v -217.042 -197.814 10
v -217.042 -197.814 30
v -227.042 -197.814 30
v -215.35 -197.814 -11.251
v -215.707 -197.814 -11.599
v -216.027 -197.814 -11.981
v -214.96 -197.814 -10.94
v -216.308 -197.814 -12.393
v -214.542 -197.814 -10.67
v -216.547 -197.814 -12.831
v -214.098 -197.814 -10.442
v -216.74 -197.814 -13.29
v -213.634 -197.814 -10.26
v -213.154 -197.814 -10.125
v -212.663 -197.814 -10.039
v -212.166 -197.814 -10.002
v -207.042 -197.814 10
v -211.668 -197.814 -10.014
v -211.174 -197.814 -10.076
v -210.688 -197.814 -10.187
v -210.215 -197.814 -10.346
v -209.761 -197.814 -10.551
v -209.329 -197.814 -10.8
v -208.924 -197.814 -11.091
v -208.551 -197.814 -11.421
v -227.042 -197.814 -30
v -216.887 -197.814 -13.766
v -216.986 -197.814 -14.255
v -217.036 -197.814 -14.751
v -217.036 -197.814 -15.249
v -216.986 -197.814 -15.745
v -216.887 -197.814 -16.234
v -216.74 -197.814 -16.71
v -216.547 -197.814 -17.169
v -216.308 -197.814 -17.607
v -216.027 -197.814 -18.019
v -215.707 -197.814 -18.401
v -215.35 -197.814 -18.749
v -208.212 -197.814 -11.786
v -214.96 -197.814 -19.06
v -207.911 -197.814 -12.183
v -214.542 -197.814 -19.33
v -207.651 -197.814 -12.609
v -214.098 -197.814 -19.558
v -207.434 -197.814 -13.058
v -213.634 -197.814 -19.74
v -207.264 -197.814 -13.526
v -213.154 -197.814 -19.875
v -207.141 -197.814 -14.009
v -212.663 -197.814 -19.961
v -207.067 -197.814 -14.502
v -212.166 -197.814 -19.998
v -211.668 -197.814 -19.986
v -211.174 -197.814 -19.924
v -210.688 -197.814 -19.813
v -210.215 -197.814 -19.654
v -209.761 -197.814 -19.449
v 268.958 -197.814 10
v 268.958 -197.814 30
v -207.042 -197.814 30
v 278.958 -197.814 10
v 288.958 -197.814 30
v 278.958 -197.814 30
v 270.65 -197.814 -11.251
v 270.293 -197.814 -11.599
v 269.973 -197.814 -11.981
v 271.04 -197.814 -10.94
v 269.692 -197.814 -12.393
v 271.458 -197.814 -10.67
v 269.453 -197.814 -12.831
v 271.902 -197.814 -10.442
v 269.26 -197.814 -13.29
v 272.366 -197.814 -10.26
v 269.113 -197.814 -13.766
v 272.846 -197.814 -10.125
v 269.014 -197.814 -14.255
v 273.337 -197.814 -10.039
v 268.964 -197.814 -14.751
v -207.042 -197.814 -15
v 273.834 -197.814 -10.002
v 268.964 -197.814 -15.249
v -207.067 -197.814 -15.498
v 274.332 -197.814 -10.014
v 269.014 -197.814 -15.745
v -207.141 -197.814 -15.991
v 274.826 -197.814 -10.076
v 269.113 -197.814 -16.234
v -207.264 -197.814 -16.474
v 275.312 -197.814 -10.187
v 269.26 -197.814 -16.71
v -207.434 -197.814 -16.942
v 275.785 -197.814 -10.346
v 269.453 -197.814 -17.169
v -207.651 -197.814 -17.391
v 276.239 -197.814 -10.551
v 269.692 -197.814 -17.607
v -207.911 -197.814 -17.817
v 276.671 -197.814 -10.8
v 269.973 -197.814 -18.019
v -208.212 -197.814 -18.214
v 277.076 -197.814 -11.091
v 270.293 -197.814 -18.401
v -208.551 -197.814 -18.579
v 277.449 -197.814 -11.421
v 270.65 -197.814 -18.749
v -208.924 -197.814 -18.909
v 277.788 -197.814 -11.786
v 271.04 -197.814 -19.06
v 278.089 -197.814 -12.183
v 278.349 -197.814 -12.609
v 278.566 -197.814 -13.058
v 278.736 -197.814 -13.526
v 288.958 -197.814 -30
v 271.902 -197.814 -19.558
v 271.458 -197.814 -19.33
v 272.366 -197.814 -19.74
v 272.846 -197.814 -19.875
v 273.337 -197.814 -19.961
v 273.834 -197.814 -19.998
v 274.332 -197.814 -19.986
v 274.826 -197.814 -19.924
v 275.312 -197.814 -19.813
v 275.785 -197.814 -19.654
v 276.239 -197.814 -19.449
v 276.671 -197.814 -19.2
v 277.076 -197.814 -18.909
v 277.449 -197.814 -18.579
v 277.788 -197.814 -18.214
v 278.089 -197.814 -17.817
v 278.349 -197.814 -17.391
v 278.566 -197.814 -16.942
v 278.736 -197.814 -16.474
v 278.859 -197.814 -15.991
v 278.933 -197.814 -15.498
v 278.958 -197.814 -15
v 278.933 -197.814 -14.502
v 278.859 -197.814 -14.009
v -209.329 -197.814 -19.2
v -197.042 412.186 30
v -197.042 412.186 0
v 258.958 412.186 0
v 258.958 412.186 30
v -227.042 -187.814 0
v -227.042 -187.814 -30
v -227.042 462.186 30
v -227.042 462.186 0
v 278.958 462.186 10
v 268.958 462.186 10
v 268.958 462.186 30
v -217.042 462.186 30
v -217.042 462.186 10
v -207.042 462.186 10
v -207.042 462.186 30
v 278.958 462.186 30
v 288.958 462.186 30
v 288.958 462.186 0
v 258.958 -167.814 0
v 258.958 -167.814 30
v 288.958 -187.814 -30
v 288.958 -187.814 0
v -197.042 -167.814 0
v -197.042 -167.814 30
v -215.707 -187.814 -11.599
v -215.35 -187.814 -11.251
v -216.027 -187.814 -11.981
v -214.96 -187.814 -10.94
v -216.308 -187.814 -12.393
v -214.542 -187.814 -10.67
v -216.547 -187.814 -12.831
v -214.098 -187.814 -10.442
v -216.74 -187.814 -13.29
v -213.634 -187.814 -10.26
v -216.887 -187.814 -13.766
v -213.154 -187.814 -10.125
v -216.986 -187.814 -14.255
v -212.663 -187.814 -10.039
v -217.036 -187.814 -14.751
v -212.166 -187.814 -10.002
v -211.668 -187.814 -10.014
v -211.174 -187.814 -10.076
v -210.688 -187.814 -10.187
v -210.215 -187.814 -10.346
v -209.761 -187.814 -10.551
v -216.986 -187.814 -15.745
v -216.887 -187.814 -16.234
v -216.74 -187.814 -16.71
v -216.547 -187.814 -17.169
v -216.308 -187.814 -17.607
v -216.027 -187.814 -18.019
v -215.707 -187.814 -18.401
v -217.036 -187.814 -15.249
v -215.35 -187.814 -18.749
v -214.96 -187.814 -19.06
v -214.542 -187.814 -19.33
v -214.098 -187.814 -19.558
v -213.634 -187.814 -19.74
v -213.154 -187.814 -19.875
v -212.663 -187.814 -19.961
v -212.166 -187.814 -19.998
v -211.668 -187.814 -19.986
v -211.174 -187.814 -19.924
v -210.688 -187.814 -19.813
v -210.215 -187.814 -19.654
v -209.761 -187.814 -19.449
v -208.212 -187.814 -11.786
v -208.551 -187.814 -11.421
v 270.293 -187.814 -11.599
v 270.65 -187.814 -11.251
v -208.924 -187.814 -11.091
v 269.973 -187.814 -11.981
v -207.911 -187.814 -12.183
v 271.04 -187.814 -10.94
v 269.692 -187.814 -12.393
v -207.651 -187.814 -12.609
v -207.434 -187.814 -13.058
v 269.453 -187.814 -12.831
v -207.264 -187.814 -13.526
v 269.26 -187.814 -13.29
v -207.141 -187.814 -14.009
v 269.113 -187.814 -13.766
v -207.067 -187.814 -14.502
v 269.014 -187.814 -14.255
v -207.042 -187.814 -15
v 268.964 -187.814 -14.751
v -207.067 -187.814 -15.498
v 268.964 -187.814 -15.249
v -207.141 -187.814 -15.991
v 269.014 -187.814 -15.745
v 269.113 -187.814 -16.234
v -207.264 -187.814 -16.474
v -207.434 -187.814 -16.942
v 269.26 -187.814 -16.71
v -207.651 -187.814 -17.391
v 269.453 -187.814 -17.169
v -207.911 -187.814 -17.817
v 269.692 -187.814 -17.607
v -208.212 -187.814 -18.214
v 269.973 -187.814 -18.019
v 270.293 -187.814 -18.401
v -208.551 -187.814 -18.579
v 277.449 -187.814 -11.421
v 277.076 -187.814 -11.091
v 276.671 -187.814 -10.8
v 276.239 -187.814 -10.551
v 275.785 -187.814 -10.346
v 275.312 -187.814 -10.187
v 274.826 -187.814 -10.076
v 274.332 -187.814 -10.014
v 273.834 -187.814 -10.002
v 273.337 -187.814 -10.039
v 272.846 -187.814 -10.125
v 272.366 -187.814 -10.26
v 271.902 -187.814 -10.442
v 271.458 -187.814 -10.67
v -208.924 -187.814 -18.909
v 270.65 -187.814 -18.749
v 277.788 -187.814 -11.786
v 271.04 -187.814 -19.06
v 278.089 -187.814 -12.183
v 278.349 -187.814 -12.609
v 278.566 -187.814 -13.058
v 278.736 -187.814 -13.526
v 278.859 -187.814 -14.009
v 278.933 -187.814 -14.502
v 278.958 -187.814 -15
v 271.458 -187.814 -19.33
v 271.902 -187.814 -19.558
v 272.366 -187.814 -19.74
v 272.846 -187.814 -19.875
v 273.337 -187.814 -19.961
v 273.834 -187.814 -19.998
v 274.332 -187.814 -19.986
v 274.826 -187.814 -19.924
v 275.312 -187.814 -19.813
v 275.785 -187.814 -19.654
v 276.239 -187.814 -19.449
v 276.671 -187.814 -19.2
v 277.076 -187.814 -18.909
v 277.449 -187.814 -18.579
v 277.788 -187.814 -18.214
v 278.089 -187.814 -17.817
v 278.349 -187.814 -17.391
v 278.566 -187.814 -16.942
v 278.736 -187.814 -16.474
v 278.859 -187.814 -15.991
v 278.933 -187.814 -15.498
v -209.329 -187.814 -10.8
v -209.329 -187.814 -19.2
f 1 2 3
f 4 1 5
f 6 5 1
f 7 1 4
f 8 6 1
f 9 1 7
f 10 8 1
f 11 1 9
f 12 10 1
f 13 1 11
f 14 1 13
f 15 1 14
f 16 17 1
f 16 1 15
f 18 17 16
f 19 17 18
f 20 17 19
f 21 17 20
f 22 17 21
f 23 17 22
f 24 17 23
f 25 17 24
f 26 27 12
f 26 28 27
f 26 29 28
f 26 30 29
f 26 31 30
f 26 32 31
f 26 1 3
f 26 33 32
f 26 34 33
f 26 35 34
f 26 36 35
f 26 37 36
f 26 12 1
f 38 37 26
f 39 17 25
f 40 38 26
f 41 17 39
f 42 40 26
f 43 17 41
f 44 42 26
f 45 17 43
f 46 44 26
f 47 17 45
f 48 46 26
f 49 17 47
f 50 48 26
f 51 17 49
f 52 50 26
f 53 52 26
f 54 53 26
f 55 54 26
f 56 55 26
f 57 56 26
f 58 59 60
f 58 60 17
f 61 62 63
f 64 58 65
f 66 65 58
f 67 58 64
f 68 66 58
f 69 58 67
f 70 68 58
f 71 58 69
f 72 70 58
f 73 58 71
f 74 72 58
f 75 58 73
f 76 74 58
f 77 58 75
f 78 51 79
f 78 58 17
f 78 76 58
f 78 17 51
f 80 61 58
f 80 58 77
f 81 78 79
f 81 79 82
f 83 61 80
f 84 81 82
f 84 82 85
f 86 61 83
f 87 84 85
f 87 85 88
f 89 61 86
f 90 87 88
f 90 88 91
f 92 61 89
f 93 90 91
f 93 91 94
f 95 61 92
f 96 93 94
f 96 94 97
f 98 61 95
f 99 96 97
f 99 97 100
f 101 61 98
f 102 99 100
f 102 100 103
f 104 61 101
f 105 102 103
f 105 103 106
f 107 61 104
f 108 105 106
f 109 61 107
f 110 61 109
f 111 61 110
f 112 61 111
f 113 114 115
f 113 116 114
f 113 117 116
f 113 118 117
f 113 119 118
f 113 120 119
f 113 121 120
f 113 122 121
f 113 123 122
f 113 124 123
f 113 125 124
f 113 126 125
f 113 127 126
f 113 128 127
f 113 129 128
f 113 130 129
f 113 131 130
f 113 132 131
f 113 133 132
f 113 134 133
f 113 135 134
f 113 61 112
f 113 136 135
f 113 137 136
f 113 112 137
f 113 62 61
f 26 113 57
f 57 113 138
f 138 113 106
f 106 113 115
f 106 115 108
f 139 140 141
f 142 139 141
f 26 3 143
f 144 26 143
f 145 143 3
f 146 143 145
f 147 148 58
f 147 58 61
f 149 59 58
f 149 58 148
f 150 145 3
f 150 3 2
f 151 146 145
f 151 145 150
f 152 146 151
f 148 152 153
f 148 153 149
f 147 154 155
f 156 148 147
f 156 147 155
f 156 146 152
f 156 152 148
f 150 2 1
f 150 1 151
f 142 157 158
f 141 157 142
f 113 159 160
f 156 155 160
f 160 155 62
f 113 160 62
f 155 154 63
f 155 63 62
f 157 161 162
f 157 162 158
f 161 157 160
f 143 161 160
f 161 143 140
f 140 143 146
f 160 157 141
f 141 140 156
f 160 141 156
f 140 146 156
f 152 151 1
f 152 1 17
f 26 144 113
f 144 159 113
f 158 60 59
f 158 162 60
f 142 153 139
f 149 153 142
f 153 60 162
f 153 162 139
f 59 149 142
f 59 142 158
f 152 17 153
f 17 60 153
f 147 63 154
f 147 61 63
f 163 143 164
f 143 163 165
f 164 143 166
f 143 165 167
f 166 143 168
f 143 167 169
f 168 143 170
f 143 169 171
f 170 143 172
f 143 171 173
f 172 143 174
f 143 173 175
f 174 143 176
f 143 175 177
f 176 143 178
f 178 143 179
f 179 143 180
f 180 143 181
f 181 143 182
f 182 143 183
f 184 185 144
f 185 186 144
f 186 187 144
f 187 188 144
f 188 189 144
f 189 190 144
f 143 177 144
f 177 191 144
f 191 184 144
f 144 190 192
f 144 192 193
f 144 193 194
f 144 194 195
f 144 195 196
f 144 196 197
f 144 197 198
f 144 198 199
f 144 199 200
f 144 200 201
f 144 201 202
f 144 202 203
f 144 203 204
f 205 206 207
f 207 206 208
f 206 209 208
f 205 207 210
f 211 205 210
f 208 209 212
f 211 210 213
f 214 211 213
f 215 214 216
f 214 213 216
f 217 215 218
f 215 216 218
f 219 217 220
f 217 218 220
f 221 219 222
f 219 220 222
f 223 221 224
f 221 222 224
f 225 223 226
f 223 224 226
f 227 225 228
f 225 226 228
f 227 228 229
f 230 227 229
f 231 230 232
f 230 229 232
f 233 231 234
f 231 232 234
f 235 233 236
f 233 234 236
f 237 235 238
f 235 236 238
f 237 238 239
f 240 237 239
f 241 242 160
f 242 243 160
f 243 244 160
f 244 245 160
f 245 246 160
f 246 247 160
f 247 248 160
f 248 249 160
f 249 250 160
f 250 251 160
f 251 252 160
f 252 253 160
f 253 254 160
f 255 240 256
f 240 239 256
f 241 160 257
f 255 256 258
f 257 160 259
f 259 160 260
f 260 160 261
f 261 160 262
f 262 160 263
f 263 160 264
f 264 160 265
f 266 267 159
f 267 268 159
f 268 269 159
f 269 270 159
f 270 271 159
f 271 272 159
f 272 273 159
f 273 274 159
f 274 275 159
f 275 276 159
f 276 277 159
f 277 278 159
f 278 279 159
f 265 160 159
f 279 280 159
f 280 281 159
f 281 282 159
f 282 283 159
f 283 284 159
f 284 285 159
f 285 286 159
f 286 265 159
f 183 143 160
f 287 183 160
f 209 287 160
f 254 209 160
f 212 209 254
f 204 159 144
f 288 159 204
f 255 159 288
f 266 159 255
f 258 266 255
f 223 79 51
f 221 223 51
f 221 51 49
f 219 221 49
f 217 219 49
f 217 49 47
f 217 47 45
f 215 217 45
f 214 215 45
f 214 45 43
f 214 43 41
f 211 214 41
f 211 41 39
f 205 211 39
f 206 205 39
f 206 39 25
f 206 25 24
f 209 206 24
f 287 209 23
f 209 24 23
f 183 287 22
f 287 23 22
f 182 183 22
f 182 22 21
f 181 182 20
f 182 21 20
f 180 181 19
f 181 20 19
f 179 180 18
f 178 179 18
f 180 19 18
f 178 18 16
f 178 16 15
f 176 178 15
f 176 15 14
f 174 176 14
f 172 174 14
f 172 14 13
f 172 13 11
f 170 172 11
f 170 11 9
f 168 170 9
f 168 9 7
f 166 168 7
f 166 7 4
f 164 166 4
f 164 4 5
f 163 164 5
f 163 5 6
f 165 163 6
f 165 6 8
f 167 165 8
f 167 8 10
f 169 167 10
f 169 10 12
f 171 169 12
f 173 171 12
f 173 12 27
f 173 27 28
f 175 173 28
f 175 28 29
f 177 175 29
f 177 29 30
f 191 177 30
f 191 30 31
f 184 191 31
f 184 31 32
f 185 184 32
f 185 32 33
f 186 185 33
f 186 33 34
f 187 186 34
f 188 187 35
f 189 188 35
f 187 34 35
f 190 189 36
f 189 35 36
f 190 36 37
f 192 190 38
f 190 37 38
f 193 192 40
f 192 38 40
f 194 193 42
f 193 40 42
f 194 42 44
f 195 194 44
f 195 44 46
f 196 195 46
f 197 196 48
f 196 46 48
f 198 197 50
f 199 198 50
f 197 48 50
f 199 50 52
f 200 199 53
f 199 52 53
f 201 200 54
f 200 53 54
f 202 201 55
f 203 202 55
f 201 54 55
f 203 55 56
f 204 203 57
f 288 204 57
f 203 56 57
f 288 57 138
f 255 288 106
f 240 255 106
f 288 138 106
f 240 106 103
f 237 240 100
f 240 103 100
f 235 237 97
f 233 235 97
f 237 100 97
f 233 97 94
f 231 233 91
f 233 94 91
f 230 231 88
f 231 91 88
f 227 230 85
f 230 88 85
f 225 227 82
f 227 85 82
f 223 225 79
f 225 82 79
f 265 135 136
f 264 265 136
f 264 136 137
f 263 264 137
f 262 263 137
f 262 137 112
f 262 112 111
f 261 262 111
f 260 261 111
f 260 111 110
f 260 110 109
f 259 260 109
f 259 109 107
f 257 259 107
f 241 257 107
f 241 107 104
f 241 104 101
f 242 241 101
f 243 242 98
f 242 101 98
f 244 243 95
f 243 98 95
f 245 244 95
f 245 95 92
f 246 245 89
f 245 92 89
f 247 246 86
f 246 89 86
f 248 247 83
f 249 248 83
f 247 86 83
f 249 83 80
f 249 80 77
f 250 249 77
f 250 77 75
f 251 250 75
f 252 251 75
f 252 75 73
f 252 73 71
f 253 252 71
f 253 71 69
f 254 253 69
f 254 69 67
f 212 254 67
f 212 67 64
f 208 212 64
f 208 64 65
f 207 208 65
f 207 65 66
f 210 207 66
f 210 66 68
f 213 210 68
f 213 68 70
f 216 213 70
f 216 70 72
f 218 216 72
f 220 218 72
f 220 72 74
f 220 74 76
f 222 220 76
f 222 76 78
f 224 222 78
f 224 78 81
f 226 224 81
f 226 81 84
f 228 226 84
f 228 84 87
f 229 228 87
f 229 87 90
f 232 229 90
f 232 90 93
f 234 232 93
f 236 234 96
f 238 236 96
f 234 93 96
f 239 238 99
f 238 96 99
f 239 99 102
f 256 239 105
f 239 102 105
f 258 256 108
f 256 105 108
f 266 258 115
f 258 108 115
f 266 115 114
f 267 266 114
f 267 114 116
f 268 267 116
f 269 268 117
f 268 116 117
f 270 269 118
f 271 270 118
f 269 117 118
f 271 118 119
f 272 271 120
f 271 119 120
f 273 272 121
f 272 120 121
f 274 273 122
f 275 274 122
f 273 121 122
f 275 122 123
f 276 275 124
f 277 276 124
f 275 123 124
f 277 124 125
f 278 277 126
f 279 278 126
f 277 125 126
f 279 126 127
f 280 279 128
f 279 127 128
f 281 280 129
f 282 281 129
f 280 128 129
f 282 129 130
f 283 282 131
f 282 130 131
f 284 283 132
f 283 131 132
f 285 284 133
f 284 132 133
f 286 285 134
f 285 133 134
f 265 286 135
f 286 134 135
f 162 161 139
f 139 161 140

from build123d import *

# Parameters (mm, degrees)
F0_W     = 516
F0_H     = 660
F0_W_2   = 456
F0_H_2   = 580
F1_DEPTH = 20
F2_W     = 10
F2_H     = 660
F3_DEPTH = 10
F4_DEPTH = 10
F5_W     = 30
F5_H     = 10
F6_DEPTH = 30
F8_D     = 10
F9_DEPTH = 456


with BuildPart() as f1:
    # F0 (on Top) → F1 (new body)
    with BuildSketch(Plane.XY):
        with Locations((30.9582352638, 132.1864551082)):
            Rectangle(F0_W, F0_H)
        with Locations((30.9582352638, 122.1864551082)):
            Rectangle(F0_W_2, F0_H_2, mode=Mode.SUBTRACT)
    extrude(amount=F1_DEPTH)

    # F2 (on face) → F3 (cut)
    with BuildSketch(Plane.XY.offset(20)):
        with Locations((-212.0417647362, 132.1864551082)):
            Rectangle(F2_W, F2_H)
        with Locations((273.9582352638, 132.1864551082)):
            Rectangle(F2_W, F2_H)
    extrude(amount=-F3_DEPTH, mode=Mode.SUBTRACT)

    # F4 (add): faces of the model
    f4_faces = [f1.faces().sort_by_distance(p)[0] for p in [
        (283.9582352638, 132.1864551082, 20),
        (-222.0417647362, 132.1864551082, 20),
        (30.9582352638, -189.6761251533, 20),
    ]]
    extrude(f4_faces, amount=F4_DEPTH)

    # F5 (on face) → F6 (join)
    with BuildSketch(Plane(origin=(0, 0, 0), x_dir=(1, 0, 0), z_dir=(0, 0, -1))):
        with Locations((273.9582352638, 192.8135448918)):
            Rectangle(F5_W, F5_H)
        with Locations((-212.0417647362, 192.8135448918)):
            Rectangle(F5_W, F5_H)
    extrude(amount=F6_DEPTH)

    # F8 (through all)
    with Locations(Plane(origin=(0, -187.8135448918, 0), x_dir=(-1, 0, 0), z_dir=(0, 1, 0))):
        with Locations((212.0417647362, -15), (-273.9582352638, -15)):
            Hole(F8_D / 2)

    # F9 (add, through all): a face of the model
    f9_faces = [f1.faces().sort_by_distance(p)[0] for p in [
        (258.9582352638, -192.8135448918, -15),
    ]]
    extrude(f9_faces, amount=F9_DEPTH)


solid = f1.part
